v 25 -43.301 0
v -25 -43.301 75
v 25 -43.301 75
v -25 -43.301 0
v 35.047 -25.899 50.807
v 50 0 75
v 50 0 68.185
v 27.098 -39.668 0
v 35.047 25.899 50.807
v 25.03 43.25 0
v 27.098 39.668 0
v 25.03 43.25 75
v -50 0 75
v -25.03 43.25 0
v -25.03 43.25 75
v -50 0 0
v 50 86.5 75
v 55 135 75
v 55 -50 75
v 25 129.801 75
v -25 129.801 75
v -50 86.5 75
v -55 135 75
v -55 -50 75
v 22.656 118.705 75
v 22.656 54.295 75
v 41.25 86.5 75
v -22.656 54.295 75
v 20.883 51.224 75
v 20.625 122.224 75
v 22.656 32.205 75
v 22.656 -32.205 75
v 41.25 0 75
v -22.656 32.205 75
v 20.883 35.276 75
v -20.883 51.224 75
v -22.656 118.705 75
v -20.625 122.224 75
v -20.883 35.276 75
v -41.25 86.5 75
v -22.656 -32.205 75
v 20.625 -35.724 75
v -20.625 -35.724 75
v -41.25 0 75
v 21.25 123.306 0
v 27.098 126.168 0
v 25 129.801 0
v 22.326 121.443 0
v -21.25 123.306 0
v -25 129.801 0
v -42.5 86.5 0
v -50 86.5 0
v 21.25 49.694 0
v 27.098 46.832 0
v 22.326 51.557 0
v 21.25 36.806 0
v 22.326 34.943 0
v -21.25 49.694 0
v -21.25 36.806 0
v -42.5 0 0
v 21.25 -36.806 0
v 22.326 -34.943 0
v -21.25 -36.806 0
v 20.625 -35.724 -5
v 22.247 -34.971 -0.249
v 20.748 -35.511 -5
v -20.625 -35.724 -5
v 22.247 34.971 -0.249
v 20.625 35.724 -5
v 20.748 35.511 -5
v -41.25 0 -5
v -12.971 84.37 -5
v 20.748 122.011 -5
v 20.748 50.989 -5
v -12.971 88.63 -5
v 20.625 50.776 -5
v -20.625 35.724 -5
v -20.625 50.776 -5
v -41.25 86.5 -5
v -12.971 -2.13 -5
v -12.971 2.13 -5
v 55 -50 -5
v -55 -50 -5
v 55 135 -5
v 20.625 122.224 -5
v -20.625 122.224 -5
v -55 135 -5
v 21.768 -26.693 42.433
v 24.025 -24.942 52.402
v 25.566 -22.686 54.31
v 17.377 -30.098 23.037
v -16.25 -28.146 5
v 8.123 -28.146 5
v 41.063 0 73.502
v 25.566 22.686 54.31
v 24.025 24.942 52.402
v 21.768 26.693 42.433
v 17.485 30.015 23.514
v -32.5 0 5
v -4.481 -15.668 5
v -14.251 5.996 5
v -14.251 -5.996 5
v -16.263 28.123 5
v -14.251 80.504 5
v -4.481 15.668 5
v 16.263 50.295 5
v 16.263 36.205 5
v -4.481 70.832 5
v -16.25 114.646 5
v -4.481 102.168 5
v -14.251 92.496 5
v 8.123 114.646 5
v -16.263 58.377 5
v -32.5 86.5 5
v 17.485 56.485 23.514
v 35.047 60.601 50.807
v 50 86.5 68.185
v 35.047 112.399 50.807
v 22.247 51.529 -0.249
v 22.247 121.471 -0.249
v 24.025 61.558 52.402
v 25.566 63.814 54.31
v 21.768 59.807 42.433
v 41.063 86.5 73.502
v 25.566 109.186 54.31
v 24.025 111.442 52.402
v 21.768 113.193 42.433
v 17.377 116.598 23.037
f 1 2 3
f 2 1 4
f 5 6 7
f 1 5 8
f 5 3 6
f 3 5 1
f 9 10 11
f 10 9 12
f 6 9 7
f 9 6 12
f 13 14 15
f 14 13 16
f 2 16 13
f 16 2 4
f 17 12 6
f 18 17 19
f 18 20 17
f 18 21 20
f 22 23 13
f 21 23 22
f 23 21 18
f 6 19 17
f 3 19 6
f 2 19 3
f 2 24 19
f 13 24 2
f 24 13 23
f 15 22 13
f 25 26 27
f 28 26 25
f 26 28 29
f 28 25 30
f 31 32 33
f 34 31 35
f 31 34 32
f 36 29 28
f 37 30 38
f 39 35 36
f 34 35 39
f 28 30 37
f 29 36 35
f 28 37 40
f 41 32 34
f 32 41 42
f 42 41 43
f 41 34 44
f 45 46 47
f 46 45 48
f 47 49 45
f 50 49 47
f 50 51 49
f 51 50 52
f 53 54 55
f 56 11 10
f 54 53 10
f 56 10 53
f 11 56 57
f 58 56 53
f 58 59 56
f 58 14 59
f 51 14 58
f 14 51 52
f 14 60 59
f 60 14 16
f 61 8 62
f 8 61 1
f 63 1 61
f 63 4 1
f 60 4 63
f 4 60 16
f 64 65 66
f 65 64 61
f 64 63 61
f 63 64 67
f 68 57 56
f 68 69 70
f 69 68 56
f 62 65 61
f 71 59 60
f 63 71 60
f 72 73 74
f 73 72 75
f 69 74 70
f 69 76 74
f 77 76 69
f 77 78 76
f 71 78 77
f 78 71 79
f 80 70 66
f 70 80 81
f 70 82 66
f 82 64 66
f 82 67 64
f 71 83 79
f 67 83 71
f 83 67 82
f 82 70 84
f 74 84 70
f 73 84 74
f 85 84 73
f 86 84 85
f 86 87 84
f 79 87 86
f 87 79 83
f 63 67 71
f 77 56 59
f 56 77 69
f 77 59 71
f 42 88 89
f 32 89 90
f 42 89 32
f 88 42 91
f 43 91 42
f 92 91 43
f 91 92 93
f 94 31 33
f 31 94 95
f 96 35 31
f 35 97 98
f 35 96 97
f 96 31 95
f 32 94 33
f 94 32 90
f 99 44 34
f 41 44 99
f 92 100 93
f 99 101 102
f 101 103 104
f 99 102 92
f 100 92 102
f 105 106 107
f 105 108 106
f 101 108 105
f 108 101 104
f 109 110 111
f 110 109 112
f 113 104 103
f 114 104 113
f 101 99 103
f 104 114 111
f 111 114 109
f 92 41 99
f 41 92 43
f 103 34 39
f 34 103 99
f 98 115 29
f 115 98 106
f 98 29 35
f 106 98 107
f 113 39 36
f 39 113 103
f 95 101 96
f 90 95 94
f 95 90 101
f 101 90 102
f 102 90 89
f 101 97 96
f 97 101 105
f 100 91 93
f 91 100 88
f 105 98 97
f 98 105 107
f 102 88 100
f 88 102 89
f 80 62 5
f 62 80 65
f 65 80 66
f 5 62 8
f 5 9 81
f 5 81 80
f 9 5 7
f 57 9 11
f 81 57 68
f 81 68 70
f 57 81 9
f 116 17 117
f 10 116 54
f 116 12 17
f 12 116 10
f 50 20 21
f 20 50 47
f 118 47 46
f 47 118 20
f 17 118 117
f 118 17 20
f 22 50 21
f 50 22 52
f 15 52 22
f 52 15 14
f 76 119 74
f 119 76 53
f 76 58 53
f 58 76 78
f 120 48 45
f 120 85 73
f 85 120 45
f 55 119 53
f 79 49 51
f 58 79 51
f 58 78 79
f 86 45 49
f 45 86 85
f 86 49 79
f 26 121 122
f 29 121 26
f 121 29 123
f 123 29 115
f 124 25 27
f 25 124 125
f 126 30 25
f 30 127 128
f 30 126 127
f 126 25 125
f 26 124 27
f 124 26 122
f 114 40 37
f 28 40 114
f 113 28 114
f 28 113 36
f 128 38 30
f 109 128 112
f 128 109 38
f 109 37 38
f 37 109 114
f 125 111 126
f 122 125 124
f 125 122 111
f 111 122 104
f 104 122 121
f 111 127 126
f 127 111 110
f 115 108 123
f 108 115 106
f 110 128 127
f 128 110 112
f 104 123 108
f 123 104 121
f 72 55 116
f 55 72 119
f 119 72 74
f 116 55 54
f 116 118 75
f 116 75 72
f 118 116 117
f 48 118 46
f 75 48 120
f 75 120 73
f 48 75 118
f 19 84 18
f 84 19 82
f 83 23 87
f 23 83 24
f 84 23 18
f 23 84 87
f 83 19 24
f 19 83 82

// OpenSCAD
$fn=6;

/* TODO
 - zaoblit hrany
 - sroubovatelna forma
 - musi ji vyndat z formy
 - diry na zavlahu?
*/

module planter(hole=0) {
difference() {
	intersection() {
		union() {
		cylinder(d2=20, d1=20, h=15);
			translate([0,0,-1]) cylinder(d2=17, d1=16.5, h=1); //index
		}
	union() {
		difference() {
			cylinder(d2=20, d1=20, h=15);
			translate([0,0,1]) cylinder(d2=17, d1=13, h=16); //pothole
			translate([0,17.3/2*hole,1]) rotate([0,0,45]) cylinder(d2=12, d1=9.2, h=15, $fn=4); //pothole-join
		}
		translate([-3,0,-2]) scale([1,0.9,1.3]) rotate([0,90,0]) rotate([0,0,30]) cylinder(d1=5, d2=38, h=15); //balcony
		translate([0,0,-1]) cylinder(d2=17, d1=16.5, h=1); //index
	}
	}
	translate([-3,0,-2]) scale([1,0.9,1.22]) rotate([0,90,0]) rotate([0,0,30]) cylinder(d1=1, d2=34, h=15); //balcony
}

}

module double() {
	translate([0,0,0]) planter(1);	
	translate([0,17.3,0]) planter(-1);
}

//!planter();
//!double()

//translate([0,0,15.1]) planter();
//translate([0,-20,0]) planter();
//double();

scale(5) difference() {
	translate([-11,-10,-1]) cube([22,37,16]);
	double();
}
